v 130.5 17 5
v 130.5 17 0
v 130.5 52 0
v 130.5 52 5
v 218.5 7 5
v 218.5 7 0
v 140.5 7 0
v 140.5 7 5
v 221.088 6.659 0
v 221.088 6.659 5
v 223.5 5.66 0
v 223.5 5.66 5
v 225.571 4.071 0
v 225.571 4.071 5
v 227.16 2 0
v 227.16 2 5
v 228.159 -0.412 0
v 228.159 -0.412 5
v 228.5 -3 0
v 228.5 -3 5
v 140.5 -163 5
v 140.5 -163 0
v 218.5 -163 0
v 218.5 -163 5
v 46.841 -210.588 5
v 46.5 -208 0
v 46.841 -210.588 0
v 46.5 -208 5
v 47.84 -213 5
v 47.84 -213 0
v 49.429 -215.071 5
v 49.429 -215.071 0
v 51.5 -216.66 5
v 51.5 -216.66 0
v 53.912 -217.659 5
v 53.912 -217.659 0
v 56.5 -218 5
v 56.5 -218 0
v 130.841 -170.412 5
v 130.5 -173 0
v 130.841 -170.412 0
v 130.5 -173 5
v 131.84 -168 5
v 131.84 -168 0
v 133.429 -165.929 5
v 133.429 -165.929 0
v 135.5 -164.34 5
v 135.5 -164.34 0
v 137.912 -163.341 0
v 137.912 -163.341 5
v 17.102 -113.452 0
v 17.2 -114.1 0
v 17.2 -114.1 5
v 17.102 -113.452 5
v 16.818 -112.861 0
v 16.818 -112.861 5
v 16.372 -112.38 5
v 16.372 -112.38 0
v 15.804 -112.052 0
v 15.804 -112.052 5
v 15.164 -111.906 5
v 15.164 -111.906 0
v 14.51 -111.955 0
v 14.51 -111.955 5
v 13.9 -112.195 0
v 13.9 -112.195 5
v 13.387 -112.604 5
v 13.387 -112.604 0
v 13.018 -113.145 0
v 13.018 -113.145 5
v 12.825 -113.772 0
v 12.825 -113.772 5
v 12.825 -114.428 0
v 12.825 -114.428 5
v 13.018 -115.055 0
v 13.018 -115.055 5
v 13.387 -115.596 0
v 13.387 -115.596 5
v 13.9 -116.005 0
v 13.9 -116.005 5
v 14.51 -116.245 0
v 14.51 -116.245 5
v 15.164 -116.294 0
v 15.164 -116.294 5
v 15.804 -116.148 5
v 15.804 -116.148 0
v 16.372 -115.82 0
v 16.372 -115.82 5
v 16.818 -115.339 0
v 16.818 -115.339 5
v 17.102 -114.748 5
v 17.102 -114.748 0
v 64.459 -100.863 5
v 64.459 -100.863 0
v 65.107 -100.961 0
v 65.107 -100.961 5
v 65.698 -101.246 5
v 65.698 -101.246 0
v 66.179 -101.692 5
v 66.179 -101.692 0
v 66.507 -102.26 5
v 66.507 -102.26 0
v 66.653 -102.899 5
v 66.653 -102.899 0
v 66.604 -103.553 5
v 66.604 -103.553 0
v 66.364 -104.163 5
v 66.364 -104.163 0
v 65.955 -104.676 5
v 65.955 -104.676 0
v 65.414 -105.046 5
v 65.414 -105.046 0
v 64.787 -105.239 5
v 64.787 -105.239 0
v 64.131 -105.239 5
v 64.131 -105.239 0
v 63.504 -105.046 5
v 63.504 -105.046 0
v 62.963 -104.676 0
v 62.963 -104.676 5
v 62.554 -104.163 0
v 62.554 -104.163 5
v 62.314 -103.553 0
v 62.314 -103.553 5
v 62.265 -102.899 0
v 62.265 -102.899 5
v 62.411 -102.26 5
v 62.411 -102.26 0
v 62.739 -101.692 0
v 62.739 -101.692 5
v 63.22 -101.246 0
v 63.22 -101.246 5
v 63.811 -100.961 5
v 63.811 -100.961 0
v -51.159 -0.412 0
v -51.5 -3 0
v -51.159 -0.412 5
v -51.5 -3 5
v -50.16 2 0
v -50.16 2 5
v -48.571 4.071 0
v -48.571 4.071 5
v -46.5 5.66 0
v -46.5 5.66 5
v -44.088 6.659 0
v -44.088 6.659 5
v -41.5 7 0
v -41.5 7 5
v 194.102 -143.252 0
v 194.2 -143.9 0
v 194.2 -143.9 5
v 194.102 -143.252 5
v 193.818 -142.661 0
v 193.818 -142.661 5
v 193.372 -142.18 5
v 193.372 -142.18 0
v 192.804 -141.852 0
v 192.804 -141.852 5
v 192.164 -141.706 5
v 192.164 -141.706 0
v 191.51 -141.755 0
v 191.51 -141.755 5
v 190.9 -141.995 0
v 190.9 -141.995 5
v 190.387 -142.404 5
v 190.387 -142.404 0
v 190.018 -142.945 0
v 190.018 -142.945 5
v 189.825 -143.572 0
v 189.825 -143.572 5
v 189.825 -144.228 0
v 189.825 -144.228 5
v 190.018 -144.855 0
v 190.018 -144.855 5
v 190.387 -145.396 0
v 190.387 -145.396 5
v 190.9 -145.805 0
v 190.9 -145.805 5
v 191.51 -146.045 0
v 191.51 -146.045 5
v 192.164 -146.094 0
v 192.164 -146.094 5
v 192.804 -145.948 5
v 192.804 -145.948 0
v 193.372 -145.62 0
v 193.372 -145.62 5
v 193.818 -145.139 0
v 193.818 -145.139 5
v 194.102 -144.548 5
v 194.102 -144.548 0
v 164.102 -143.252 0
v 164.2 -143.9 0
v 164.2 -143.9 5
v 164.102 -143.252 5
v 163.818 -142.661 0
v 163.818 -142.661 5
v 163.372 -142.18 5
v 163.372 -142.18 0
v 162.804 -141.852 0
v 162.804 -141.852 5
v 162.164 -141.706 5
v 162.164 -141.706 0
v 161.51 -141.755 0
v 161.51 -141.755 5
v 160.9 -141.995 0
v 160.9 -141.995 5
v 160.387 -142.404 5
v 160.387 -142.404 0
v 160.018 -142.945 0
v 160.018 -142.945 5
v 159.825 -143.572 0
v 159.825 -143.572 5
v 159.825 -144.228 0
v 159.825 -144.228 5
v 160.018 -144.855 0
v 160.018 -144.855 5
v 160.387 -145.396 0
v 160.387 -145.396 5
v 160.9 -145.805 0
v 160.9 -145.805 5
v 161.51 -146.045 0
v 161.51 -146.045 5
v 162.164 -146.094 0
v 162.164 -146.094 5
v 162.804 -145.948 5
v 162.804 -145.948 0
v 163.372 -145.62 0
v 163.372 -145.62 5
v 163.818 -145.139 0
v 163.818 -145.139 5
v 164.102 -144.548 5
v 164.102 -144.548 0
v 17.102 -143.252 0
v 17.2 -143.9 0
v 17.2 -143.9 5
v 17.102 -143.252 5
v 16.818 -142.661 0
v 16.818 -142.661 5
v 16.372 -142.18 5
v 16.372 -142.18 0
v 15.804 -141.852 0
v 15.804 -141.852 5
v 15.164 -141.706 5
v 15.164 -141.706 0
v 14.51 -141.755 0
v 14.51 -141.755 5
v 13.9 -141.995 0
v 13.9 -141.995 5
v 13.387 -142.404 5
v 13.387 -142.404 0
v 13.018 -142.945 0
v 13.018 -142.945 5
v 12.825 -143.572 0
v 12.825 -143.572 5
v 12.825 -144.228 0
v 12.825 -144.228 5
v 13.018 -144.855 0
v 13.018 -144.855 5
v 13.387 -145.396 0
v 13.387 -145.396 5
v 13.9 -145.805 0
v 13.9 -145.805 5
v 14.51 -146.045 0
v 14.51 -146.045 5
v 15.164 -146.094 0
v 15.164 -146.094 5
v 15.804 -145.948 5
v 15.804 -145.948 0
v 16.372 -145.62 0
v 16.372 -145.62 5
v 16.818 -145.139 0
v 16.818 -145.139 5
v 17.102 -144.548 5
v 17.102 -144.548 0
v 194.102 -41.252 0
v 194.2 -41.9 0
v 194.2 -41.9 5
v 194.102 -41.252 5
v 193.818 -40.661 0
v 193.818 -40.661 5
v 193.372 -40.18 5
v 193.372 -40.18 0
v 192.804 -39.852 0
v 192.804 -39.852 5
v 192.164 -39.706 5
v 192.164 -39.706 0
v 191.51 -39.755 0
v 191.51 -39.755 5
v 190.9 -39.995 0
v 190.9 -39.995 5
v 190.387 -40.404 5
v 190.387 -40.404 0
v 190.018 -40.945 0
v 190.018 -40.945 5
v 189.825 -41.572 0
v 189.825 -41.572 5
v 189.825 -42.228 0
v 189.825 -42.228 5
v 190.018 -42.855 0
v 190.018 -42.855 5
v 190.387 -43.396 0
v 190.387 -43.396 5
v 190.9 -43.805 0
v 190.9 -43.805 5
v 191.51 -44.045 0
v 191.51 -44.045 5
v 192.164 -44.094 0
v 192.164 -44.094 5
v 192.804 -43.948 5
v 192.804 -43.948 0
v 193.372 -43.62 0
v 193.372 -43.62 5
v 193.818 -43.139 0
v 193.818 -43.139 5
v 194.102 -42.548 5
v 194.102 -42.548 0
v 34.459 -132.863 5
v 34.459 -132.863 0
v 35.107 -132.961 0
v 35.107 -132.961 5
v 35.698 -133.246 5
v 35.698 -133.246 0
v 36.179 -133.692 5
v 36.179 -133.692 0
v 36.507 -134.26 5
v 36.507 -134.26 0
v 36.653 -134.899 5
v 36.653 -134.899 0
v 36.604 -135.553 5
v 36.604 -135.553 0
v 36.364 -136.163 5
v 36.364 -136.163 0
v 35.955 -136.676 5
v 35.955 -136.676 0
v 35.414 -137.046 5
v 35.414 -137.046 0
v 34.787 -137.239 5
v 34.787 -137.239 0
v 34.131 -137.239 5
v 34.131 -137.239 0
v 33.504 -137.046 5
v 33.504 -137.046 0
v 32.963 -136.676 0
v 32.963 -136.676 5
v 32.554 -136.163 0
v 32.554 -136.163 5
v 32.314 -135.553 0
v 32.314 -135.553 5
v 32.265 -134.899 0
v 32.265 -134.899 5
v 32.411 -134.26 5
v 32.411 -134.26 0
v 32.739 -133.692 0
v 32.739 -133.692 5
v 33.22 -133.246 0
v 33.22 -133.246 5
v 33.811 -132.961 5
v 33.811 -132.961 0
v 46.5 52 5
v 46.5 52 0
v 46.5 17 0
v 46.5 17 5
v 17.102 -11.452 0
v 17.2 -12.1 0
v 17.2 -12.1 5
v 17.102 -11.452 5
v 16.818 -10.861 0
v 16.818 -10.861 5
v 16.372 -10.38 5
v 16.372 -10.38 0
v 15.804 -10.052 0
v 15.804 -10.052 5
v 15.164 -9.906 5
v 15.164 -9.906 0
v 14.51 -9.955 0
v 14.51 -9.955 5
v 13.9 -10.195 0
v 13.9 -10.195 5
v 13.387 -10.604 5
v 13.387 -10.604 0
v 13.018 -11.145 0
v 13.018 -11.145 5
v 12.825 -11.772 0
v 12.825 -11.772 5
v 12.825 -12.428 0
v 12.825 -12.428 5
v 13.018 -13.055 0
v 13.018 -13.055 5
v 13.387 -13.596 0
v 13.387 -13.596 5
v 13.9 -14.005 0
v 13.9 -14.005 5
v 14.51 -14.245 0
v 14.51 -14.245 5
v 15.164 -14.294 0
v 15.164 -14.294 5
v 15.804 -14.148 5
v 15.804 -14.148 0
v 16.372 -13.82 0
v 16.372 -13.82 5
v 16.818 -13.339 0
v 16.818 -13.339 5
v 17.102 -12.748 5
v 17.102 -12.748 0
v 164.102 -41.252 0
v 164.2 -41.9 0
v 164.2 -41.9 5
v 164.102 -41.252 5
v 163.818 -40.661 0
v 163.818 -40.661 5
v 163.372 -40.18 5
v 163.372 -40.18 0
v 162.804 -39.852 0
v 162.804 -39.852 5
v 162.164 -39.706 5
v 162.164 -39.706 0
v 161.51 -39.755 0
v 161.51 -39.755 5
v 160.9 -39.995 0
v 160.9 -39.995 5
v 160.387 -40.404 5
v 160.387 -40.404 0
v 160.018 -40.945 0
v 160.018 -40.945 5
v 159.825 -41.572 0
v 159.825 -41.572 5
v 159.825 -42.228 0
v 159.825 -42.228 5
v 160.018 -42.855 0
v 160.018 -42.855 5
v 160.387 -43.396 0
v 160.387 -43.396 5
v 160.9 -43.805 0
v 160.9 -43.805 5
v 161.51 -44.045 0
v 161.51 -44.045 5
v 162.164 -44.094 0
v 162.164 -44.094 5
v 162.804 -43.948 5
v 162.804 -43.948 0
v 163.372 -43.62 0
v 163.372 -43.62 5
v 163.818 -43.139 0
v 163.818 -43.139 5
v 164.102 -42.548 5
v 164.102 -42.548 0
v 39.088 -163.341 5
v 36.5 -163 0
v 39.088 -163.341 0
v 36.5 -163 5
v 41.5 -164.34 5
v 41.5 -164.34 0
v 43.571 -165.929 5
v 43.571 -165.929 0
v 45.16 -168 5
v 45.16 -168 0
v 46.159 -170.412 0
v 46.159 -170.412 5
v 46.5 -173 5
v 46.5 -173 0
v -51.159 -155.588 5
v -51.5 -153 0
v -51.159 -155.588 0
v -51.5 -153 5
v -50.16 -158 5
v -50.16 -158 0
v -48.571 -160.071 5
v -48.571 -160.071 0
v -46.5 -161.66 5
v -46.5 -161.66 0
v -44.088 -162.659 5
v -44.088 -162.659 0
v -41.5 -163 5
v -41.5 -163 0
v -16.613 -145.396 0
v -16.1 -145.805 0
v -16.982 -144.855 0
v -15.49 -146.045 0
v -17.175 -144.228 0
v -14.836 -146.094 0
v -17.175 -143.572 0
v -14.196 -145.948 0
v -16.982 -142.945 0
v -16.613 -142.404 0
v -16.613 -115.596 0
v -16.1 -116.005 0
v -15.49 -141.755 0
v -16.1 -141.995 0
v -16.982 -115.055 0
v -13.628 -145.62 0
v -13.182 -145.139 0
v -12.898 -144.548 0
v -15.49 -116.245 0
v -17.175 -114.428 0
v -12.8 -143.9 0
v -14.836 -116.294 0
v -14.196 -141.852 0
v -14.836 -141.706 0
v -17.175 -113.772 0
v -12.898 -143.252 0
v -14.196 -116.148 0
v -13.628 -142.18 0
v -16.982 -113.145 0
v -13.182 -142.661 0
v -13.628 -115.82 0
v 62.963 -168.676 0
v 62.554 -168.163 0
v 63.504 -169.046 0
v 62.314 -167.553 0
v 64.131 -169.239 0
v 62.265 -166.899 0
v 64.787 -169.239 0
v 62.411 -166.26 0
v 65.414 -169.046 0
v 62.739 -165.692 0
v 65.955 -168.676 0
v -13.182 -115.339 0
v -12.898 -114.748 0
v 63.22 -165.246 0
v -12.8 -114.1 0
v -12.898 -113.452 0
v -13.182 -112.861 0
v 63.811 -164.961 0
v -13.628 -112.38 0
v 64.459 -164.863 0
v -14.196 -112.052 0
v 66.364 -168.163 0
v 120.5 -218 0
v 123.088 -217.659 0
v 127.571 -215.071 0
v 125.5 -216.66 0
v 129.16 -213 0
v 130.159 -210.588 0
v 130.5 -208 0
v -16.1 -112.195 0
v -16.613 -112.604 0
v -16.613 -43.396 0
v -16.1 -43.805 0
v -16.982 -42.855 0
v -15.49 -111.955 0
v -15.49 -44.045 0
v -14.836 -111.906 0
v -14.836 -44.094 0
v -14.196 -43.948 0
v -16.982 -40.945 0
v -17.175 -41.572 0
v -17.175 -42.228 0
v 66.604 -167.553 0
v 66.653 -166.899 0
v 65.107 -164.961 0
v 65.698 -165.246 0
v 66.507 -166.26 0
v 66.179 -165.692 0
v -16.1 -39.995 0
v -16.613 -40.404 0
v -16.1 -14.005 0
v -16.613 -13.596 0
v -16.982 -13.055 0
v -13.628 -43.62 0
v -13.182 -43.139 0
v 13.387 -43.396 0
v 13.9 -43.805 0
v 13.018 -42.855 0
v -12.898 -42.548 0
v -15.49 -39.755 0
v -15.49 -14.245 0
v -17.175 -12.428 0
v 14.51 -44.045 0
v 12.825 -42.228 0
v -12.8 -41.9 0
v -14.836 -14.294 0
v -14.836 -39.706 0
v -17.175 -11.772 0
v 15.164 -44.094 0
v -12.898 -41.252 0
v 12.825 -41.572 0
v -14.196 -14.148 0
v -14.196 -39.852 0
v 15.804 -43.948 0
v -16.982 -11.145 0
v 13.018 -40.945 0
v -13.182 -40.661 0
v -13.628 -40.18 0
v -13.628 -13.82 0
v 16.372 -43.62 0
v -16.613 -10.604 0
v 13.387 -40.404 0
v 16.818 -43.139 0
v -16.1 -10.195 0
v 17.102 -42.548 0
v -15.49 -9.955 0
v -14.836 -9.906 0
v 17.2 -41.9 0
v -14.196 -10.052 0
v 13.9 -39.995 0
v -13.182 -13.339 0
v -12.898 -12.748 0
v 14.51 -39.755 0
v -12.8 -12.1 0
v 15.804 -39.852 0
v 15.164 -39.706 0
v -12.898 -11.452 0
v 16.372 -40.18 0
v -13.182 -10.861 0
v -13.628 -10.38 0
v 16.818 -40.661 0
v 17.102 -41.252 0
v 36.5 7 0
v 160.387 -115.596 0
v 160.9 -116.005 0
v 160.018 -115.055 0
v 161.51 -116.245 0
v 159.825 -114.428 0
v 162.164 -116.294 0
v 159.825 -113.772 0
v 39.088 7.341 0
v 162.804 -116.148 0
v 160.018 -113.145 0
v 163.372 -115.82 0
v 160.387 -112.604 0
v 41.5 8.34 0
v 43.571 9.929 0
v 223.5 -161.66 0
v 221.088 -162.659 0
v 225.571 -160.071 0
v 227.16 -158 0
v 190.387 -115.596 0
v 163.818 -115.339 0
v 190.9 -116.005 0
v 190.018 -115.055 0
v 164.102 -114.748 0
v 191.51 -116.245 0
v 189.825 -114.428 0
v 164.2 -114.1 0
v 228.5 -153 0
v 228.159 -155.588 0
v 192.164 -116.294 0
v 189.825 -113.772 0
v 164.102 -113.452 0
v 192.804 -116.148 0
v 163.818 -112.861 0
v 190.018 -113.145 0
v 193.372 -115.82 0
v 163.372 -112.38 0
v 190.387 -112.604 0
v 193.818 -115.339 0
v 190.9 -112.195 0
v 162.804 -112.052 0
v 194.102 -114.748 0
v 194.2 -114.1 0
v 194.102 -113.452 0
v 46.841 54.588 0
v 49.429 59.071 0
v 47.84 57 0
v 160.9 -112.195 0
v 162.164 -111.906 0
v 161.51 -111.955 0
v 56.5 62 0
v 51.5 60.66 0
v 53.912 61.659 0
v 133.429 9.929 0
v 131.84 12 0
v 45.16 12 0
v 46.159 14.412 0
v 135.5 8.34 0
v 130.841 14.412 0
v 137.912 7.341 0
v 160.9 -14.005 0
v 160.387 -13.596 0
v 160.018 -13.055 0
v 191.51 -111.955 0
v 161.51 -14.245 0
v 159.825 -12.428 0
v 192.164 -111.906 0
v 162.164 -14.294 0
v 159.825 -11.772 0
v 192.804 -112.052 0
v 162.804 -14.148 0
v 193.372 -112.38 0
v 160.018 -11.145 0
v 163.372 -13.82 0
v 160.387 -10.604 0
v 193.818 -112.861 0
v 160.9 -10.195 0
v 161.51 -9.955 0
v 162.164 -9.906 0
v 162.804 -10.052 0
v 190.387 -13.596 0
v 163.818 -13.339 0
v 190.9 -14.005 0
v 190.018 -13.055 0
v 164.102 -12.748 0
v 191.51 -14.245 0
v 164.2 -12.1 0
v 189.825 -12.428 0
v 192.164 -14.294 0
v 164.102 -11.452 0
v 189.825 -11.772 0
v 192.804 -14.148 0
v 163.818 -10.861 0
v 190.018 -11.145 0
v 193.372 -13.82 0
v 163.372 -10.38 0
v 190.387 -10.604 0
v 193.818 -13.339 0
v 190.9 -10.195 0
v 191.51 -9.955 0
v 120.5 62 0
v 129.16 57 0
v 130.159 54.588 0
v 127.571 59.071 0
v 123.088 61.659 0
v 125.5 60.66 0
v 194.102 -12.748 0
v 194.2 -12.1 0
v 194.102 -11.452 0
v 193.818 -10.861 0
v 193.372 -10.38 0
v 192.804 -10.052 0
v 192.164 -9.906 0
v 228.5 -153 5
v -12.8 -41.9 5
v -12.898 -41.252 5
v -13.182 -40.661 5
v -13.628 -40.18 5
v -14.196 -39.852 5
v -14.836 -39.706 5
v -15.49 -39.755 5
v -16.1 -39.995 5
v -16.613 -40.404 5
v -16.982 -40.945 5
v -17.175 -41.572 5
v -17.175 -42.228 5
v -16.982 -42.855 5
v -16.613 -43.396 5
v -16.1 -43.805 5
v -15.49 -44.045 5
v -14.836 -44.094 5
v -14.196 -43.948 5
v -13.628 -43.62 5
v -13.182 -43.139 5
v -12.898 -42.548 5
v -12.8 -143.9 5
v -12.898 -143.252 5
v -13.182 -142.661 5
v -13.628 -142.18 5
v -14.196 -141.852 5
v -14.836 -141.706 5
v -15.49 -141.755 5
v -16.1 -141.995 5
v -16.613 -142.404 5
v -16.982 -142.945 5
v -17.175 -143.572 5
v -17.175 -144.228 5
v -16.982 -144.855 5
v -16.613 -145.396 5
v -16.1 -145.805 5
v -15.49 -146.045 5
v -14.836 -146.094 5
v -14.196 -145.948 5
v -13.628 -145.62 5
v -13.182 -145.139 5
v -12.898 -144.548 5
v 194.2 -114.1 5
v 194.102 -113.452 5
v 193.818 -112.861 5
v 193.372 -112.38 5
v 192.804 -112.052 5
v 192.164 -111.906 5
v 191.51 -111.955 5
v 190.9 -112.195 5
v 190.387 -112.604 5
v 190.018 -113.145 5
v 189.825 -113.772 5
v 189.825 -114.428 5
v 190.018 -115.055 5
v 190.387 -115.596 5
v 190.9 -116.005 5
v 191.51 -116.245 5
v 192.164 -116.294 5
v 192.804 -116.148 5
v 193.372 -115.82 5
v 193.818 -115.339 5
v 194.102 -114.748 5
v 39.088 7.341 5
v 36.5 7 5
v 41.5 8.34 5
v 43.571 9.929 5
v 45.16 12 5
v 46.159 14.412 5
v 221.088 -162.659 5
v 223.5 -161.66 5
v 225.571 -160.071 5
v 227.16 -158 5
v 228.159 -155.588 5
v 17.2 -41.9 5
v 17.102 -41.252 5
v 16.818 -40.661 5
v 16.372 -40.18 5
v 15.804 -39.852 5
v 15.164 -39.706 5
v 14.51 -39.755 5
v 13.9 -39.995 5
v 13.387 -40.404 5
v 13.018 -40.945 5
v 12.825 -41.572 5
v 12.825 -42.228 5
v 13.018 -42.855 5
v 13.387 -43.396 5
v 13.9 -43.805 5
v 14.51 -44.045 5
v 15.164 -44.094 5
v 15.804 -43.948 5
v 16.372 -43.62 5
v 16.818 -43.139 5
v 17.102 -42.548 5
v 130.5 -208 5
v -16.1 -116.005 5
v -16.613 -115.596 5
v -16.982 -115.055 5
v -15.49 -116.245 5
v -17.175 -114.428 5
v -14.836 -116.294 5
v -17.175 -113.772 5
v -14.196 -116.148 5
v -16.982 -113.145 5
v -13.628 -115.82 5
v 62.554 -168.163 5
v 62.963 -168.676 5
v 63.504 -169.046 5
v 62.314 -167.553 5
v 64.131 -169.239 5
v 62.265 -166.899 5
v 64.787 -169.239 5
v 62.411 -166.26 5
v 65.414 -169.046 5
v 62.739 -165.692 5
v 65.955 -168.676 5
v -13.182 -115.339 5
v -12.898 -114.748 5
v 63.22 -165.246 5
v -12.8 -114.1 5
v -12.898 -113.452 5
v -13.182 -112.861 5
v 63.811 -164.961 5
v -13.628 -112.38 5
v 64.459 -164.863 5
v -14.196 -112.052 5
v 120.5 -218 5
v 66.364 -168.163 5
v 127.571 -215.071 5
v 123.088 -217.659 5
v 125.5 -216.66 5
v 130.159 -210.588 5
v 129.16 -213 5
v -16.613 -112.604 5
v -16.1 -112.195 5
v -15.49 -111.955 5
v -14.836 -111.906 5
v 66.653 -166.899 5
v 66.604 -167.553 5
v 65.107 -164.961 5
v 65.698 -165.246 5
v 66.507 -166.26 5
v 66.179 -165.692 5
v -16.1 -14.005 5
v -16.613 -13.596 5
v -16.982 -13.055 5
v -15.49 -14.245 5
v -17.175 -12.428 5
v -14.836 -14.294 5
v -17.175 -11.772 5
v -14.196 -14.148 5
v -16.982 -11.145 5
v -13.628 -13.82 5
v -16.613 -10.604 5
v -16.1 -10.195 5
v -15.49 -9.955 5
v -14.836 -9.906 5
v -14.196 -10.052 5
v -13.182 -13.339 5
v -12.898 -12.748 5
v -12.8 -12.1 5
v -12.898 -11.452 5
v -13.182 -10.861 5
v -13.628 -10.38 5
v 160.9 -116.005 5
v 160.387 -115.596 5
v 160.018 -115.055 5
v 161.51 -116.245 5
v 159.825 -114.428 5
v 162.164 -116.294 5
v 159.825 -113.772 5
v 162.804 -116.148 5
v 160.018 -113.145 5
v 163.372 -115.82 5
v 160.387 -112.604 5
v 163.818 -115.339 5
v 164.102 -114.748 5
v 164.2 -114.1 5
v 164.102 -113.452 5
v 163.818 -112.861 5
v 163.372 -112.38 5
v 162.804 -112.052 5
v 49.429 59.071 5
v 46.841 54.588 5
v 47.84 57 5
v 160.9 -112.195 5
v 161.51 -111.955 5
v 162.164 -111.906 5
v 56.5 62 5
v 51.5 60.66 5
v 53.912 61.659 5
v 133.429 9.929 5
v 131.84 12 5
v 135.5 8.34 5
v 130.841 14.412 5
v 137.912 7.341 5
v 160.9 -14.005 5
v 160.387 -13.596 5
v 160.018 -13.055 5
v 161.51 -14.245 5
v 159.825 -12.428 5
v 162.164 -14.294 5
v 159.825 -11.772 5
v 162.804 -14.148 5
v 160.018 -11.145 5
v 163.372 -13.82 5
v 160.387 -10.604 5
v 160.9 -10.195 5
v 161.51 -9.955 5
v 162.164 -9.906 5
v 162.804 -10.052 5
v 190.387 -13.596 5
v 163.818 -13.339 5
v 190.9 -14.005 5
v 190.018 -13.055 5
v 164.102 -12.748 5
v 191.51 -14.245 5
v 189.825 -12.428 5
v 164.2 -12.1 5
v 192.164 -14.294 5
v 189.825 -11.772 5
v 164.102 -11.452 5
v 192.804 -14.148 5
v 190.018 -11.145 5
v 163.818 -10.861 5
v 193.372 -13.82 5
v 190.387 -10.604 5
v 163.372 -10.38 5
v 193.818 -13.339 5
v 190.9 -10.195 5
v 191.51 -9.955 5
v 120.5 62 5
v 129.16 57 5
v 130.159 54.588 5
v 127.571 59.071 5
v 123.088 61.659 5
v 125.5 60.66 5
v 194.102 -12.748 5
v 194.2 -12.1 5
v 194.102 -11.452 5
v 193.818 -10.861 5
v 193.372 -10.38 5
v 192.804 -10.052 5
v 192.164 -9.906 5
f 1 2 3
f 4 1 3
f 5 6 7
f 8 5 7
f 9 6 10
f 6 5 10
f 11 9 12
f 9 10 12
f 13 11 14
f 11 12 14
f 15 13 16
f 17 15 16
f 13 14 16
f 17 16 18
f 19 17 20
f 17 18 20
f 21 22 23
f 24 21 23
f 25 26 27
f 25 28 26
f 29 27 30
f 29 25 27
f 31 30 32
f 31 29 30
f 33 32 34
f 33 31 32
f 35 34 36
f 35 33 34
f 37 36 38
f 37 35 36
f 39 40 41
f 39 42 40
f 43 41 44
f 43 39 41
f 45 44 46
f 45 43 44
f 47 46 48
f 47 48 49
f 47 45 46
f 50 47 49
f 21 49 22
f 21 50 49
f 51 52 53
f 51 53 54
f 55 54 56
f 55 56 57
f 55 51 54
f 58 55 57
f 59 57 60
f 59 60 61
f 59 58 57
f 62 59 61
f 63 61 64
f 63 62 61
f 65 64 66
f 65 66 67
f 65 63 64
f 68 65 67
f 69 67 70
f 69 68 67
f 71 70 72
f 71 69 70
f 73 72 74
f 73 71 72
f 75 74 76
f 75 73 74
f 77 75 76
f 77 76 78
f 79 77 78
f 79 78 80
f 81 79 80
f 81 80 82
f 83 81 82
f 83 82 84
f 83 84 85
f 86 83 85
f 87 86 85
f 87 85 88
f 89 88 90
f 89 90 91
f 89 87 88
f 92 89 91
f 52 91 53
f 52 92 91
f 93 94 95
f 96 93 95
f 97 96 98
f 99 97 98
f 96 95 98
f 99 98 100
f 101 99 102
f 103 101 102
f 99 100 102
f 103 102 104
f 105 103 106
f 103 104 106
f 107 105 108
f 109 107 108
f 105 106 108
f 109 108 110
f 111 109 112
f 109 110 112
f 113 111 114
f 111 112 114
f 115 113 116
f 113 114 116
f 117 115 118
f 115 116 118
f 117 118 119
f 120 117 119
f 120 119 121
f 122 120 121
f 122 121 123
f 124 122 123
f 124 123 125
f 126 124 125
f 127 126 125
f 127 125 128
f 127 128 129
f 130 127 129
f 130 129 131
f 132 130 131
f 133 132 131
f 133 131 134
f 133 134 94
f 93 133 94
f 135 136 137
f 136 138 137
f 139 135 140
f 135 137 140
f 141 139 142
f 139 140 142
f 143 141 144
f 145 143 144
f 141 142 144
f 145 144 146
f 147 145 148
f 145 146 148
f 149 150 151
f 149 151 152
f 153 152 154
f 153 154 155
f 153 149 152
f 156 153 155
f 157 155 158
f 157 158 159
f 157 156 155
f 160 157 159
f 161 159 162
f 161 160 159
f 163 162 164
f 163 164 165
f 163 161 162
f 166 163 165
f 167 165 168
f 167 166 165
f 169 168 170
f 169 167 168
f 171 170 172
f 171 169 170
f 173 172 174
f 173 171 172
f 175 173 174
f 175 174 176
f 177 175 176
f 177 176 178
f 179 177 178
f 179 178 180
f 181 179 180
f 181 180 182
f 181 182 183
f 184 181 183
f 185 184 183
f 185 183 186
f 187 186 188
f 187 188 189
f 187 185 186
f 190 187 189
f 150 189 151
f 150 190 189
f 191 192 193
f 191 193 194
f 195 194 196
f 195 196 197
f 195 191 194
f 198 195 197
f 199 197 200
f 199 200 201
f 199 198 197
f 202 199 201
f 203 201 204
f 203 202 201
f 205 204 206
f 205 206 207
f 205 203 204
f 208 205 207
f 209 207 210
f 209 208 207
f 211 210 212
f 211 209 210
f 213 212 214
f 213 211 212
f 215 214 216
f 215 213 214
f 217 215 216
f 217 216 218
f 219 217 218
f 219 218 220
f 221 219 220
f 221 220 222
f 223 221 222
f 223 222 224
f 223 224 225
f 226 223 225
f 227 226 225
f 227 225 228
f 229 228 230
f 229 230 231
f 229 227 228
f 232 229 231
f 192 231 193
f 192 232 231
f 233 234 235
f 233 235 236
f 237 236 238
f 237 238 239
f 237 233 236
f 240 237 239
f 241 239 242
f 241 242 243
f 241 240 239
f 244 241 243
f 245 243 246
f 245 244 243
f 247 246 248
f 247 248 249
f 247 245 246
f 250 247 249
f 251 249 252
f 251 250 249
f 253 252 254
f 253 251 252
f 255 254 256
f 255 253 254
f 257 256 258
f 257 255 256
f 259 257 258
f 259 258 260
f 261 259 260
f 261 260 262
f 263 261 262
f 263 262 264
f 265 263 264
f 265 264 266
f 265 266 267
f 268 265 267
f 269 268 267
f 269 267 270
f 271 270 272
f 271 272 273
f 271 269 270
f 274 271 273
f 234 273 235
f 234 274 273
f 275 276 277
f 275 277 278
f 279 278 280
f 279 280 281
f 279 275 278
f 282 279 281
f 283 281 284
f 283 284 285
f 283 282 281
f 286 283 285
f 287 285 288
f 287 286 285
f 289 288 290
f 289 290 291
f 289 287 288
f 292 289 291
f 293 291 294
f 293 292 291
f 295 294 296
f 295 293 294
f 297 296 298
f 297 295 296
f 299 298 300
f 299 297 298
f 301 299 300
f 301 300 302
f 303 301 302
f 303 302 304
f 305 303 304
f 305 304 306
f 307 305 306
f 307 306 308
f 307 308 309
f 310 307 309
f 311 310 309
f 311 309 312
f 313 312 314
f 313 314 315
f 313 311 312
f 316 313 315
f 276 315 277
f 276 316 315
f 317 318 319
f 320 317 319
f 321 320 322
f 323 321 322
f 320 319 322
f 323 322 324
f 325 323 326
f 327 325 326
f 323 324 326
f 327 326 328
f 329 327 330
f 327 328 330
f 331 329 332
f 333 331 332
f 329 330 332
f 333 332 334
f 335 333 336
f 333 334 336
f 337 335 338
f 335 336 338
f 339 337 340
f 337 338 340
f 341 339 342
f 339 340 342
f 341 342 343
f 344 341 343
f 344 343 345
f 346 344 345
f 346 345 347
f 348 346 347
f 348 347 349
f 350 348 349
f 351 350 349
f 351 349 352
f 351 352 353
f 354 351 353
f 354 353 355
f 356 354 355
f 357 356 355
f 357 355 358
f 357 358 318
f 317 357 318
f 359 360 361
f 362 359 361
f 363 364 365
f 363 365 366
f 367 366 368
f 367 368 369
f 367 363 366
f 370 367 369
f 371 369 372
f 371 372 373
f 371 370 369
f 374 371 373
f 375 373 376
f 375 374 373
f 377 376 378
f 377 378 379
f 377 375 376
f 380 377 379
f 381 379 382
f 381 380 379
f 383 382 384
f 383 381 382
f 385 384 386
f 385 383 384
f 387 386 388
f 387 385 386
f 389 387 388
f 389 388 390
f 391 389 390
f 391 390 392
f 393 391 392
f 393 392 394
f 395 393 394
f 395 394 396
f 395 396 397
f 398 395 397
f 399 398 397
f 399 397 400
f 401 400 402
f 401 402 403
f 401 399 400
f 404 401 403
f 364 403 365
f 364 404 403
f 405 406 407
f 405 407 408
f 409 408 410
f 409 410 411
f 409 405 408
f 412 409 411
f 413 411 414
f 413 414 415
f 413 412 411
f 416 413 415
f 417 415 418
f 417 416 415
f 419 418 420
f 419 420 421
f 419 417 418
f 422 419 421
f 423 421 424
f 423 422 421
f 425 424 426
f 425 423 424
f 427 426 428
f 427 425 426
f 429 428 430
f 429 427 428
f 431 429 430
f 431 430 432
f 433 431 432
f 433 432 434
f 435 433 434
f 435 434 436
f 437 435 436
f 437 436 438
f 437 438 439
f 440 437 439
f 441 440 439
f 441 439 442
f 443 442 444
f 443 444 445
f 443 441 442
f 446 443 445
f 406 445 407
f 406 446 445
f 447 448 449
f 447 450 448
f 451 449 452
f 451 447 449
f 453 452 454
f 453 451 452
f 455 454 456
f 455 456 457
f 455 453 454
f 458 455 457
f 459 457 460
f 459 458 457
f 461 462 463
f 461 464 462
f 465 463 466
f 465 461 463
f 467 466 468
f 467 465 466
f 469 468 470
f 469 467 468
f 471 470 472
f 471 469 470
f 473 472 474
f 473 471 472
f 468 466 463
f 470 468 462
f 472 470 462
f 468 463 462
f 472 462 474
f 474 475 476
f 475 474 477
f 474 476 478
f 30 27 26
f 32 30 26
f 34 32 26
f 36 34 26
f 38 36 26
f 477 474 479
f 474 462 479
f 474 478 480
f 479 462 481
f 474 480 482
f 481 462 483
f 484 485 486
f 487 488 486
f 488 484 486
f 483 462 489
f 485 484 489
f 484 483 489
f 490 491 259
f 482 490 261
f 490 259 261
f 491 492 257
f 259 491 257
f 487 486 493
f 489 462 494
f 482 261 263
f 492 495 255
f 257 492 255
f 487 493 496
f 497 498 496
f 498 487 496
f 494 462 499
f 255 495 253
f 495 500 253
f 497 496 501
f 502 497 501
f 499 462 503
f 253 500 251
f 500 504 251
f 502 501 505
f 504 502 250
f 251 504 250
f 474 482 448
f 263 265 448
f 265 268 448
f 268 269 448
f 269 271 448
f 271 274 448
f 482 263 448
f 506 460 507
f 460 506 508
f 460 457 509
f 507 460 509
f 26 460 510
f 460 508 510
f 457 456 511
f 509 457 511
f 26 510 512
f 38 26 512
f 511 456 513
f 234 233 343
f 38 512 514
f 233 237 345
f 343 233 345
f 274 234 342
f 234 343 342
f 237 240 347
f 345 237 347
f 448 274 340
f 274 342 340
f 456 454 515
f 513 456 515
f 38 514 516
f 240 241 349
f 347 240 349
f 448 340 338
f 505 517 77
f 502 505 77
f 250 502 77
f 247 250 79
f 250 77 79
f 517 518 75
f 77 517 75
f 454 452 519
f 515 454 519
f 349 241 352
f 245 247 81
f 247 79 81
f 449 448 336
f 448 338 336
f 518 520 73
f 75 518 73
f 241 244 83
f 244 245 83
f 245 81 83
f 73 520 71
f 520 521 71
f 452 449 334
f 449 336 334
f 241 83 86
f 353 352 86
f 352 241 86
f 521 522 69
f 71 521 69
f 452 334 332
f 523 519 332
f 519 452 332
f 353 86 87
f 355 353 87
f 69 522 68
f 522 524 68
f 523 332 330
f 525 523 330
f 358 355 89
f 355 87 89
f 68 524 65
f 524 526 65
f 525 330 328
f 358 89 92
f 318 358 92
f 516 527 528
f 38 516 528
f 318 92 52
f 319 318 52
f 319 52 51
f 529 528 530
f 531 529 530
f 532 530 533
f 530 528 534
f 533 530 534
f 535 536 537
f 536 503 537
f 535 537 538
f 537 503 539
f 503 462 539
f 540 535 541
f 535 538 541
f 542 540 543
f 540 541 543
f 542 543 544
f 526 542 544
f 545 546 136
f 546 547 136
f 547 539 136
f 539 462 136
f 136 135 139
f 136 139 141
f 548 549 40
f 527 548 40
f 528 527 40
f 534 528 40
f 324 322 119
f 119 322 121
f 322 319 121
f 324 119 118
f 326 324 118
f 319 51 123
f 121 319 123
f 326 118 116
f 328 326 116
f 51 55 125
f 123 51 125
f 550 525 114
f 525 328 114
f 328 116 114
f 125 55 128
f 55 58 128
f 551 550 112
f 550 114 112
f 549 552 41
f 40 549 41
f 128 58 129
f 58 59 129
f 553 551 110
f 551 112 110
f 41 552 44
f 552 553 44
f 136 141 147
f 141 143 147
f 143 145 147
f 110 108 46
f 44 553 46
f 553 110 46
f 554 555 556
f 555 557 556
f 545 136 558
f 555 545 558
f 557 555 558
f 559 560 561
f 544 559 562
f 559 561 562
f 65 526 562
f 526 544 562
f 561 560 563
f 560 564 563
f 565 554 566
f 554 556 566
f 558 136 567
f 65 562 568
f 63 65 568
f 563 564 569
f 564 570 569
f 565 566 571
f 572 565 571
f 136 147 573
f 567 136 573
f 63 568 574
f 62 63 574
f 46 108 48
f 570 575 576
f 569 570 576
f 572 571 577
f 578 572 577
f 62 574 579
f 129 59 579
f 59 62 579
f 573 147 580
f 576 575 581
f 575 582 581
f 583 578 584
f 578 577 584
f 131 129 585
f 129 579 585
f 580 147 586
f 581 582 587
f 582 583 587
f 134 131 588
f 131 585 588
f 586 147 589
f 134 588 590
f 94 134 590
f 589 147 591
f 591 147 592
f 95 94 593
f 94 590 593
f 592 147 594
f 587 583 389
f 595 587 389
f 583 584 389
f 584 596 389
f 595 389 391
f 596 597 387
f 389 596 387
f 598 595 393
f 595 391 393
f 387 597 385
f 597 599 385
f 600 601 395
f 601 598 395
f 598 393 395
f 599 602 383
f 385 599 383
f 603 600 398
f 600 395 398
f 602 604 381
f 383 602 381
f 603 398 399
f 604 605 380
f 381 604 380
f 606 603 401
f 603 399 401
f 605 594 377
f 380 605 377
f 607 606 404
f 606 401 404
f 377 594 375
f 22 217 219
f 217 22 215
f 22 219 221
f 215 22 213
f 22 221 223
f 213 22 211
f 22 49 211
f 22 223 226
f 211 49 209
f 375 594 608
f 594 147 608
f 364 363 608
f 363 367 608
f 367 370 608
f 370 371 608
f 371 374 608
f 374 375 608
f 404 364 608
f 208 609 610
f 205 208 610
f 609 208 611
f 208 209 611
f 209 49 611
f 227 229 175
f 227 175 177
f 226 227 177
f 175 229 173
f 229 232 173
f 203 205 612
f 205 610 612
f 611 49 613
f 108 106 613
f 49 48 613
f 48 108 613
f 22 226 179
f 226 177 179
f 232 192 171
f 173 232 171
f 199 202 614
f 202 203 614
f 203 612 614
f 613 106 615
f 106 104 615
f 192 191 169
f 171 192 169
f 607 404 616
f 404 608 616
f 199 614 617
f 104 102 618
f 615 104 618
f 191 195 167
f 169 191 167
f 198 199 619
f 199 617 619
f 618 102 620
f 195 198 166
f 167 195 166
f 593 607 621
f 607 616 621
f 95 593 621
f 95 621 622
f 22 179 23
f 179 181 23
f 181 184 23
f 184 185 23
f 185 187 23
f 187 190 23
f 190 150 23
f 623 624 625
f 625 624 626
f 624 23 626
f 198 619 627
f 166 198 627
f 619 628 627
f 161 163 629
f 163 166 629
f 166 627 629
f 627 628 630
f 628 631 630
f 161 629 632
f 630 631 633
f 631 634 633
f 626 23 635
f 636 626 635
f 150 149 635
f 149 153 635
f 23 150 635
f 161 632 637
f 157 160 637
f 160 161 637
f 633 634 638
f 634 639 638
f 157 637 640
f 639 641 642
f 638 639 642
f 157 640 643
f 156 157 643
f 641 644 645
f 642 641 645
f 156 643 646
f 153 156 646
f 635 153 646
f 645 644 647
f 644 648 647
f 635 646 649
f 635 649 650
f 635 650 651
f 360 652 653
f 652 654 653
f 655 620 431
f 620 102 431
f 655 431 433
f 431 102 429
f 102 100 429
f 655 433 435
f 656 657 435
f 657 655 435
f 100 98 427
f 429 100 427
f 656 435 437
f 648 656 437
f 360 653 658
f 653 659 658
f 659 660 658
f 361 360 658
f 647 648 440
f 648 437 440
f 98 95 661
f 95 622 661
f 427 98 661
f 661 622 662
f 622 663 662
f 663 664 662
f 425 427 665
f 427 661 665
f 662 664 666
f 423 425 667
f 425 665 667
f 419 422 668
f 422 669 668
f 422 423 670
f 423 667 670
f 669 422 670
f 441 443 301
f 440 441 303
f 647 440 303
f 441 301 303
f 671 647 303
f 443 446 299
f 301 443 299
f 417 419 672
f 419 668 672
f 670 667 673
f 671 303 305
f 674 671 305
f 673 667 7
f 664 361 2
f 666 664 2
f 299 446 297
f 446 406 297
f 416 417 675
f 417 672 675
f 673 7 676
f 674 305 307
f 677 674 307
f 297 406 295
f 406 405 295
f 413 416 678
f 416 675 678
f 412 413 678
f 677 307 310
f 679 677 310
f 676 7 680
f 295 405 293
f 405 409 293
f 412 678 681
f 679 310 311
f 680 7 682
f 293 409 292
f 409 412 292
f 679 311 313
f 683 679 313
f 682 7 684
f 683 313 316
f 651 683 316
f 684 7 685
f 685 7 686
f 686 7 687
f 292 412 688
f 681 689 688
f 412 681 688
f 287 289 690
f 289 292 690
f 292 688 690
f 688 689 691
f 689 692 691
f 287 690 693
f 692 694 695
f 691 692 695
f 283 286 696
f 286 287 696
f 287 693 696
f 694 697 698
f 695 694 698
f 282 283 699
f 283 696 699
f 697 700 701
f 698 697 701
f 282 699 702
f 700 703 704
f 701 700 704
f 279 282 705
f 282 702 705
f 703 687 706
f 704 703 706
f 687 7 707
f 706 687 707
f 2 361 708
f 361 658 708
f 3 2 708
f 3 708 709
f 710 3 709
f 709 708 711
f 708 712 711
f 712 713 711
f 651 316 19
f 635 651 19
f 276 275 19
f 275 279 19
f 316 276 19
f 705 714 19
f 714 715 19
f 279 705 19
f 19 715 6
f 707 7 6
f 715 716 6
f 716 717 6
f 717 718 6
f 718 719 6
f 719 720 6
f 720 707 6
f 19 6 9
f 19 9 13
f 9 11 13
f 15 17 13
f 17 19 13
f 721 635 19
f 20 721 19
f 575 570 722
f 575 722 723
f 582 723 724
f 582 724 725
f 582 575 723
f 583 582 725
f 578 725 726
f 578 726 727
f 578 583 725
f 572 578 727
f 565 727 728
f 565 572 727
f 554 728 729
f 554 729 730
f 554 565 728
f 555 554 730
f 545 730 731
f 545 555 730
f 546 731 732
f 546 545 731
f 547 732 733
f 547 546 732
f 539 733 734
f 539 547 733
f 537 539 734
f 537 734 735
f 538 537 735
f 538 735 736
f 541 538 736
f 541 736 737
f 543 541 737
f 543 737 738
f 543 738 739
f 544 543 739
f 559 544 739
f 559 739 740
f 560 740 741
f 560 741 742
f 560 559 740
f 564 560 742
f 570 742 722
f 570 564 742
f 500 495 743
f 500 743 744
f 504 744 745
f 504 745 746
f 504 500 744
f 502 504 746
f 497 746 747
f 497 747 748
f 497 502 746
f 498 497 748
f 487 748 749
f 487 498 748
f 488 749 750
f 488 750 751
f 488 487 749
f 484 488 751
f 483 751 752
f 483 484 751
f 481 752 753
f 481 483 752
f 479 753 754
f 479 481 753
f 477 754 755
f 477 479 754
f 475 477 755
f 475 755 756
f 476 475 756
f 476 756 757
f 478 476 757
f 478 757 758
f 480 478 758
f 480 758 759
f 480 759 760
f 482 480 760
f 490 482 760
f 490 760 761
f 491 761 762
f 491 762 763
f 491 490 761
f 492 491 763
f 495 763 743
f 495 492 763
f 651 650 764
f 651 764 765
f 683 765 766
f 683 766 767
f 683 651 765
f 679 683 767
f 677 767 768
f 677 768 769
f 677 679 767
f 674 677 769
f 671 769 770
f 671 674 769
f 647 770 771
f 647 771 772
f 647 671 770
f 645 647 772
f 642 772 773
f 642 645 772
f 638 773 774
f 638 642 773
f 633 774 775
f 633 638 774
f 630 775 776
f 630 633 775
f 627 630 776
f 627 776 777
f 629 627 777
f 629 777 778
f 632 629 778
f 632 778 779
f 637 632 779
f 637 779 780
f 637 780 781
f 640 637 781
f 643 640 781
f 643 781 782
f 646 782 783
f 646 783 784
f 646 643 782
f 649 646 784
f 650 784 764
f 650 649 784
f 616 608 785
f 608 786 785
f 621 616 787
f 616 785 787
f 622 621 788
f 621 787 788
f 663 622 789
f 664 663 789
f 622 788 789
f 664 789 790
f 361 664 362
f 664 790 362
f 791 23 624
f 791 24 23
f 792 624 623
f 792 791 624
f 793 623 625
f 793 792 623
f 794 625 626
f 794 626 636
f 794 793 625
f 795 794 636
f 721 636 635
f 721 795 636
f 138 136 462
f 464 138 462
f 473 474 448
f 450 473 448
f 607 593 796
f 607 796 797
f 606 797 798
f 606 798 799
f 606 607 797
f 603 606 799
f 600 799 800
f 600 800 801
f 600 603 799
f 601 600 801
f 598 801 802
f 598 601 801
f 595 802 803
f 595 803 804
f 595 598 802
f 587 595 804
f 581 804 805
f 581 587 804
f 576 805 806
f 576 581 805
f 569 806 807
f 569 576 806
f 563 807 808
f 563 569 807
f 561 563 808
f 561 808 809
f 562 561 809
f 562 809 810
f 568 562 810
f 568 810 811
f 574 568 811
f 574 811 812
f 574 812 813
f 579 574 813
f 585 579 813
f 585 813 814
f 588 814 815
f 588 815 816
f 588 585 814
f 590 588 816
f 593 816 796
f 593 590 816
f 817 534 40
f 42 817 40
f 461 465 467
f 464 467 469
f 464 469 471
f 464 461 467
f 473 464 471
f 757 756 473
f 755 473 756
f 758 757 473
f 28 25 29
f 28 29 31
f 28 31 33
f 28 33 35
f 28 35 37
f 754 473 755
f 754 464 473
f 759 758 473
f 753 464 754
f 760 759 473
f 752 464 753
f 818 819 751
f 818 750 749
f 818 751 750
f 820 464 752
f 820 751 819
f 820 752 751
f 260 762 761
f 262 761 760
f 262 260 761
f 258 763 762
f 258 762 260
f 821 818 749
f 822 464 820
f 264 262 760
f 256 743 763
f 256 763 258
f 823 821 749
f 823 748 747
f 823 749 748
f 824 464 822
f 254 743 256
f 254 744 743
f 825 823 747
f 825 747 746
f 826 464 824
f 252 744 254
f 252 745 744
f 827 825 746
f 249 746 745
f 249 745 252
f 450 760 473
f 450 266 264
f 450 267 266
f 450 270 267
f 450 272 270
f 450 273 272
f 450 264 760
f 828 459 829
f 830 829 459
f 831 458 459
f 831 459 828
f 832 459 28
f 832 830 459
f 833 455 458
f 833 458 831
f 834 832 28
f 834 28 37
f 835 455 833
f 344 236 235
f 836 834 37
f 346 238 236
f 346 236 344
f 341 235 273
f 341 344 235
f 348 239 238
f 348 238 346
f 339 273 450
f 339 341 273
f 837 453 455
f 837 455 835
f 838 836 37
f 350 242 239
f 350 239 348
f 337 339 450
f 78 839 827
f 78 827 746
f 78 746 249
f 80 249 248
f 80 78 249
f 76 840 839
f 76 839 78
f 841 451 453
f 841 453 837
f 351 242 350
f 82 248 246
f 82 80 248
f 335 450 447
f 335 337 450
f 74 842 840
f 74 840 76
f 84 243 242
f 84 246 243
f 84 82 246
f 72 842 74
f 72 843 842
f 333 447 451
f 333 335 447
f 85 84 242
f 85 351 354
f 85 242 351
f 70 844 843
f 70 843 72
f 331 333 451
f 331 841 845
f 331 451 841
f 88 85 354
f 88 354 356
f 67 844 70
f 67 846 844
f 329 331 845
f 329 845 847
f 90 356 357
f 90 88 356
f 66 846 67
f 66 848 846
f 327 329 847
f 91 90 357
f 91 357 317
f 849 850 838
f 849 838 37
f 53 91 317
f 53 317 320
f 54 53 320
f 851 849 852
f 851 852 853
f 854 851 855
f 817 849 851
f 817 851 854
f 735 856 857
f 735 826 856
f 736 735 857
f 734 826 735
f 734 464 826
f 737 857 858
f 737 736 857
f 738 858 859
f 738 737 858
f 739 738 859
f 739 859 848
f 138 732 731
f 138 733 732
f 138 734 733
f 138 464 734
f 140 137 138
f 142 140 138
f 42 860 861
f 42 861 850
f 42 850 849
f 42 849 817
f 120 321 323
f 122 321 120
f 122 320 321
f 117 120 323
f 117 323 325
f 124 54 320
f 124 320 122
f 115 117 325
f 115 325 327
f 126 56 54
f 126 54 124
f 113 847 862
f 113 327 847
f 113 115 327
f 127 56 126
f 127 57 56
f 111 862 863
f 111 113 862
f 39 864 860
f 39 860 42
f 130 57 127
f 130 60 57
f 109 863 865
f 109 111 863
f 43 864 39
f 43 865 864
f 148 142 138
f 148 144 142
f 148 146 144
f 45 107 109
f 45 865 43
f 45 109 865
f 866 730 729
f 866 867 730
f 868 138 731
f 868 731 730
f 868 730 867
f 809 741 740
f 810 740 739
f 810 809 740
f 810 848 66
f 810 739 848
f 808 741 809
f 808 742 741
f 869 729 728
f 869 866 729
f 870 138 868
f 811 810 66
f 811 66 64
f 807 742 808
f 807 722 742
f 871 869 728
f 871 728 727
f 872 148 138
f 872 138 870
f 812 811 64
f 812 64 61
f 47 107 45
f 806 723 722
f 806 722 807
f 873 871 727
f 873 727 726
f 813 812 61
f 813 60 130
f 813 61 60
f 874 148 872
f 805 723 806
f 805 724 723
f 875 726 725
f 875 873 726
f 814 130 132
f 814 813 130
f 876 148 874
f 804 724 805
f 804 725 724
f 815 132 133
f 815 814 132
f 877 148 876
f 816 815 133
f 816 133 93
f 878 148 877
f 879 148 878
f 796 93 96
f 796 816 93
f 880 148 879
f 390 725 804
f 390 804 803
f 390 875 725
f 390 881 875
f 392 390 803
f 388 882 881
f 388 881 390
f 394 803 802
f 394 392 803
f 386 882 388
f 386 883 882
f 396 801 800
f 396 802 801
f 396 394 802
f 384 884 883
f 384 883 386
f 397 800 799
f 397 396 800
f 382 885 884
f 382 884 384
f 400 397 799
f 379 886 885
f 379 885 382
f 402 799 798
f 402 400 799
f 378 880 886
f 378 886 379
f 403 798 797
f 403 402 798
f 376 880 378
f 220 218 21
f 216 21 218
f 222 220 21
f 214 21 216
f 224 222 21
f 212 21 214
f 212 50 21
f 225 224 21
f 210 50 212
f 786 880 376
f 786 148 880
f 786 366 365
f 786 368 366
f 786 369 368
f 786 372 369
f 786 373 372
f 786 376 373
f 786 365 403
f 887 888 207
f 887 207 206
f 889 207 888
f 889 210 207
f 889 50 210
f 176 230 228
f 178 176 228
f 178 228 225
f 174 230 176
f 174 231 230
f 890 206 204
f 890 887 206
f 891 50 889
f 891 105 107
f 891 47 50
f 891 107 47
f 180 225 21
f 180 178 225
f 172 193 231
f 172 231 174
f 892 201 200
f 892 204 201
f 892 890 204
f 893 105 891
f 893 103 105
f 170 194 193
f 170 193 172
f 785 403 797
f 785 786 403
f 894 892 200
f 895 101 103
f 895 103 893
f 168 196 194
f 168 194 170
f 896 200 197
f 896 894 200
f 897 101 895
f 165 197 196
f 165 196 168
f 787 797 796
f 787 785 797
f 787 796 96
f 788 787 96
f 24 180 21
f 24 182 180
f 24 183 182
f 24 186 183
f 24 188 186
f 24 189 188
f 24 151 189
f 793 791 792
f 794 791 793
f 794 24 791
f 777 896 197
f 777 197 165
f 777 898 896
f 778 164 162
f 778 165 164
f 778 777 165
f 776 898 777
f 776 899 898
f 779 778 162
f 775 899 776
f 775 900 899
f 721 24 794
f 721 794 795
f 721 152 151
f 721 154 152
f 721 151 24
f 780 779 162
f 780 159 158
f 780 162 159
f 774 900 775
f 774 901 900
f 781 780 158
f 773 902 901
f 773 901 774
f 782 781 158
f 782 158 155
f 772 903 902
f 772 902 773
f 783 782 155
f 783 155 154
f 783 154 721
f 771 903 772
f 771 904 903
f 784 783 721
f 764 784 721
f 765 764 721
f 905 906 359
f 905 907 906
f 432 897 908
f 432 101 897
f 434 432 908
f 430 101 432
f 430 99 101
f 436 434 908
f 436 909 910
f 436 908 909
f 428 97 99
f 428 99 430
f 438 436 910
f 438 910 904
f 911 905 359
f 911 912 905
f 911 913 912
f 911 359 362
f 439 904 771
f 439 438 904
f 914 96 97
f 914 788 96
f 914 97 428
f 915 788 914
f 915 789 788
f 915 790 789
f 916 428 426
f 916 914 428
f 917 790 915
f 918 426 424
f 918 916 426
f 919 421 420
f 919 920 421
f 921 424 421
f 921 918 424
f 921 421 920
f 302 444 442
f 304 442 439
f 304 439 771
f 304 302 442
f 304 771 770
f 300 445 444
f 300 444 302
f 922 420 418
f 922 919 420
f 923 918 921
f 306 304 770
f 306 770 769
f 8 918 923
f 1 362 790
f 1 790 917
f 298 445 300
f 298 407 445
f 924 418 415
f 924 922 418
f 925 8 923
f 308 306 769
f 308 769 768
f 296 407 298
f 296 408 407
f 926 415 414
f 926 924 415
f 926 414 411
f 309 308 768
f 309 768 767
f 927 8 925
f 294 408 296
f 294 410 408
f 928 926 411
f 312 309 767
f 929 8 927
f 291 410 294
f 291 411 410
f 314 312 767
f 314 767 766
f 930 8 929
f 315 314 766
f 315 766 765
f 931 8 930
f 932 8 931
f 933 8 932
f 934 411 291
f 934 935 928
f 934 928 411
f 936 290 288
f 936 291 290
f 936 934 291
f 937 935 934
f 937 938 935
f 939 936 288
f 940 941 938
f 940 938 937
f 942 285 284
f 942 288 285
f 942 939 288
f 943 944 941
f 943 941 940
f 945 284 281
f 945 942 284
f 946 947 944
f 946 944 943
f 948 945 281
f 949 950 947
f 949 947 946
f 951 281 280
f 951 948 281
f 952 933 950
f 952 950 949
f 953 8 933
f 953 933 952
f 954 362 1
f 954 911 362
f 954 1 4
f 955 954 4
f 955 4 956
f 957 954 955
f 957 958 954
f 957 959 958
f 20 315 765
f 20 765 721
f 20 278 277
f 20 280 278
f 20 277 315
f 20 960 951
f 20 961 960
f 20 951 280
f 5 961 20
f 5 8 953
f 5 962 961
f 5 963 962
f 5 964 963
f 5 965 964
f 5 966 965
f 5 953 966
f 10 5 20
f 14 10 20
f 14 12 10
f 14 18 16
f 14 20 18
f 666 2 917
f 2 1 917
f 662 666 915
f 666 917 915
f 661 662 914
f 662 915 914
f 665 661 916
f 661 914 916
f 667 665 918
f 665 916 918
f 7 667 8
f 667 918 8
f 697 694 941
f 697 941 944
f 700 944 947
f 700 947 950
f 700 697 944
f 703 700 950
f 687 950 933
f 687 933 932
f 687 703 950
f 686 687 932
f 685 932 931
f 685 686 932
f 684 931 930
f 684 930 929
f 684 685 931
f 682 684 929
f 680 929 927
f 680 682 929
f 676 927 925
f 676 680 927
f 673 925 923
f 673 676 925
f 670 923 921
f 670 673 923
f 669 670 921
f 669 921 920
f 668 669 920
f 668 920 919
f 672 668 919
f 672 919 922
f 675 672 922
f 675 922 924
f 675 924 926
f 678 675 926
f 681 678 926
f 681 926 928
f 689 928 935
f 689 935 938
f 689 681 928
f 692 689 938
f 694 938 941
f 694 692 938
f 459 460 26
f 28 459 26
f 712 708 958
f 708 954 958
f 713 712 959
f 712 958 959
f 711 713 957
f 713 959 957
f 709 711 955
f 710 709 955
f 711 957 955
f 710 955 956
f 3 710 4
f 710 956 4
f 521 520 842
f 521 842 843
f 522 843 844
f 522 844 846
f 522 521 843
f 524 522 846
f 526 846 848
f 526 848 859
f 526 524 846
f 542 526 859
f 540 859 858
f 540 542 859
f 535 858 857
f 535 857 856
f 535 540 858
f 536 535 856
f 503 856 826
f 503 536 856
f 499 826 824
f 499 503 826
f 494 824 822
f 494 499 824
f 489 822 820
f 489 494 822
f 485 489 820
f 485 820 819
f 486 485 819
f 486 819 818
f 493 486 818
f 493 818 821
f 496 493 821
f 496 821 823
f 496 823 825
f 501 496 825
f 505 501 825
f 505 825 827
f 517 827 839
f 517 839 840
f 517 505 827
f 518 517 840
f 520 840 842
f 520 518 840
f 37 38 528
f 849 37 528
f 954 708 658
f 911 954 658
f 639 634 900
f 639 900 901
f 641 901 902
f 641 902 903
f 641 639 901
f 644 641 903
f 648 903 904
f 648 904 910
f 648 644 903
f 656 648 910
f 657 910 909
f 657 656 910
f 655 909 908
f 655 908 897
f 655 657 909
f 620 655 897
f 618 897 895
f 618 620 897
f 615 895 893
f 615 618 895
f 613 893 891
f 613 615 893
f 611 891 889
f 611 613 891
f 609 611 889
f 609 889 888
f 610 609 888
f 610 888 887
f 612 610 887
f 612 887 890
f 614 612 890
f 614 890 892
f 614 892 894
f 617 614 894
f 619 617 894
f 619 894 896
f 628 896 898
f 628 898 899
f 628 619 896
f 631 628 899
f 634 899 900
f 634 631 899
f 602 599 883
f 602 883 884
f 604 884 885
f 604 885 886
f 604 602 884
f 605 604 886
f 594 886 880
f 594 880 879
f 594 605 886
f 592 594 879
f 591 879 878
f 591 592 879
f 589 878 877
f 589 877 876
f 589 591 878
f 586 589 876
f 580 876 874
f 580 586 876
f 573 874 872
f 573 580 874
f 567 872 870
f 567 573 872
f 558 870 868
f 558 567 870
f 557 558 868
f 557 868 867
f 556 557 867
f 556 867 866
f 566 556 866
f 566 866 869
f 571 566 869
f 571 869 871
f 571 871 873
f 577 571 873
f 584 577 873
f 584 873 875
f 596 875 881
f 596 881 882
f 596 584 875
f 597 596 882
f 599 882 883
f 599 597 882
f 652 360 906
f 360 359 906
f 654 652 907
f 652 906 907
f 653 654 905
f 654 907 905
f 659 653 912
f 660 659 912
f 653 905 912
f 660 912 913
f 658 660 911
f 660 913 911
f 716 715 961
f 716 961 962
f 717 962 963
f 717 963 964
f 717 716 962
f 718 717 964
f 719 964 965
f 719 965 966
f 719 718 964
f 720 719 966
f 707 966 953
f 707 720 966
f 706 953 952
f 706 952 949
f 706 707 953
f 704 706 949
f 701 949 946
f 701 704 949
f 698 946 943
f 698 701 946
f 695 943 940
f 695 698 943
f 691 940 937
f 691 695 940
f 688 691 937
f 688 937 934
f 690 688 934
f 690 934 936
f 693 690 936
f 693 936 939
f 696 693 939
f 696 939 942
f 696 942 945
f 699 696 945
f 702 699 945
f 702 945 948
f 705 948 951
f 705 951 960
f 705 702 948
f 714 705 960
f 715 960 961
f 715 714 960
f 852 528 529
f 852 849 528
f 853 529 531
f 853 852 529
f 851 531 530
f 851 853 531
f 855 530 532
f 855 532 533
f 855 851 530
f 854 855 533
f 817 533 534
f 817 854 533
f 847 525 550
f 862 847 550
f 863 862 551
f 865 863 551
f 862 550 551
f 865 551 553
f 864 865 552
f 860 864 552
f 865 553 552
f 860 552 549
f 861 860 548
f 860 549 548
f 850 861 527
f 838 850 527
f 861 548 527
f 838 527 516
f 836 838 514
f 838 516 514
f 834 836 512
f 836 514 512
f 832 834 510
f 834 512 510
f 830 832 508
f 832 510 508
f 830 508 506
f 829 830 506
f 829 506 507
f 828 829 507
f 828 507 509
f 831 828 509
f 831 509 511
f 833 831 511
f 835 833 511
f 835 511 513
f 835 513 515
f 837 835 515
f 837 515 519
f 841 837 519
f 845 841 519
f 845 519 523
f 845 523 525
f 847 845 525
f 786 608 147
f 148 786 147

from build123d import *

# Parameters (mm, degrees)
SKETCH_1_R          = 2.2
EXTRUDE_1_DEPTH     = 5
FILLET_1_R          = 10
CUT_EXTRUDE_1_REACH = 317.85
SKETCH_2_R          = 2.2


with BuildPart() as part:
    # 草图1 → 凸台-拉伸1 (new body)
    with BuildSketch(Plane.XY):
        Polygon((-51.5, 7), (-51.5, -163), (46.5, -163), (46.5, -218), (130.5, -218), (130.5, -163), (228.5, -163), (228.5, 7), (130.5, 7), (130.5, 62), (46.5, 62), (46.5, 7), align=None)
        with Locations((-15, -143.9)):
            Circle(SKETCH_1_R, mode=Mode.SUBTRACT)
        with Locations((15, -143.9)):
            Circle(SKETCH_1_R, mode=Mode.SUBTRACT)
        with Locations((-15, -114.1)):
            Circle(SKETCH_1_R, mode=Mode.SUBTRACT)
        with Locations((15, -114.1)):
            Circle(SKETCH_1_R, mode=Mode.SUBTRACT)
        with Locations((162, -143.9)):
            Circle(SKETCH_1_R, mode=Mode.SUBTRACT)
        with Locations((192, -143.9)):
            Circle(SKETCH_1_R, mode=Mode.SUBTRACT)
        with Locations((162, -114.1)):
            Circle(SKETCH_1_R, mode=Mode.SUBTRACT)
        with Locations((192, -114.1)):
            Circle(SKETCH_1_R, mode=Mode.SUBTRACT)
        with Locations((-15, -41.9)):
            Circle(SKETCH_1_R, mode=Mode.SUBTRACT)
        with Locations((15, -41.9)):
            Circle(SKETCH_1_R, mode=Mode.SUBTRACT)
        with Locations((-15, -12.1)):
            Circle(SKETCH_1_R, mode=Mode.SUBTRACT)
        with Locations((15, -12.1)):
            Circle(SKETCH_1_R, mode=Mode.SUBTRACT)
        with Locations((162, -41.9)):
            Circle(SKETCH_1_R, mode=Mode.SUBTRACT)
        with Locations((192, -41.9)):
            Circle(SKETCH_1_R, mode=Mode.SUBTRACT)
        with Locations((162, -12.1)):
            Circle(SKETCH_1_R, mode=Mode.SUBTRACT)
        with Locations((192, -12.1)):
            Circle(SKETCH_1_R, mode=Mode.SUBTRACT)
    extrude(amount=EXTRUDE_1_DEPTH)

    # 圆角1
    fillet_1_edges = [part.edges().sort_by_distance(p)[0] for p in [
        (130.5, 7, 2.5),
        (228.5, 7, 2.5),
        (228.5, -163, 2.5),
        (130.5, -163, 2.5),
        (130.5, -218, 2.5),
        (46.5, -218, 2.5),
        (46.5, -163, 2.5),
        (-51.5, -163, 2.5),
        (-51.5, 7, 2.5),
        (46.5, 7, 2.5),
        (46.5, 62, 2.5),
        (130.5, 62, 2.5),
    ]]
    fillet(fillet_1_edges, radius=FILLET_1_R)

    # 草图2 → 切除-拉伸1 (cut, up to next)
    with BuildSketch(Plane(origin=(0, 0, 0), x_dir=(-1, 0, 0), z_dir=(0, 0, -1)), mode=Mode.PRIVATE) as cut_extrude_1_sk1:
        with Locations(Location((-64.458980338, -103.063390978, 0), (0, 0, 90))):
            Circle(SKETCH_2_R)
    cut_extrude_1_tool1 = extrude(cut_extrude_1_sk1.sketch, amount=-CUT_EXTRUDE_1_REACH, mode=Mode.PRIVATE) & part.part
    # 草图2 → 切除-拉伸1 (cut, up to next)
    with BuildSketch(Plane(origin=(0, 0, 0), x_dir=(-1, 0, 0), z_dir=(0, 0, -1)), mode=Mode.PRIVATE) as cut_extrude_1_sk2:
        with Locations(Location((-34.458980337, -135.063390978, 0), (0, 0, 90))):
            Circle(SKETCH_2_R)
    cut_extrude_1_tool2 = extrude(cut_extrude_1_sk2.sketch, amount=-CUT_EXTRUDE_1_REACH, mode=Mode.PRIVATE) & part.part
    # 草图2 → 切除-拉伸1 (cut, up to next)
    with BuildSketch(Plane(origin=(0, 0, 0), x_dir=(-1, 0, 0), z_dir=(0, 0, -1)), mode=Mode.PRIVATE) as cut_extrude_1_sk3:
        with Locations(Location((-64.458980338, -167.063390978, 0), (0, 0, 90))):
            Circle(SKETCH_2_R)
    cut_extrude_1_tool3 = extrude(cut_extrude_1_sk3.sketch, amount=-CUT_EXTRUDE_1_REACH, mode=Mode.PRIVATE) & part.part
    add(cut_extrude_1_tool1.solids().sort_by_distance((64.45898, -103.063391, 0))[0], mode=Mode.SUBTRACT)
    add(cut_extrude_1_tool2.solids().sort_by_distance((34.45898, -135.063391, 0))[0], mode=Mode.SUBTRACT)
    add(cut_extrude_1_tool3.solids().sort_by_distance((64.45898, -167.063391, 0))[0], mode=Mode.SUBTRACT)


solid = part.part
